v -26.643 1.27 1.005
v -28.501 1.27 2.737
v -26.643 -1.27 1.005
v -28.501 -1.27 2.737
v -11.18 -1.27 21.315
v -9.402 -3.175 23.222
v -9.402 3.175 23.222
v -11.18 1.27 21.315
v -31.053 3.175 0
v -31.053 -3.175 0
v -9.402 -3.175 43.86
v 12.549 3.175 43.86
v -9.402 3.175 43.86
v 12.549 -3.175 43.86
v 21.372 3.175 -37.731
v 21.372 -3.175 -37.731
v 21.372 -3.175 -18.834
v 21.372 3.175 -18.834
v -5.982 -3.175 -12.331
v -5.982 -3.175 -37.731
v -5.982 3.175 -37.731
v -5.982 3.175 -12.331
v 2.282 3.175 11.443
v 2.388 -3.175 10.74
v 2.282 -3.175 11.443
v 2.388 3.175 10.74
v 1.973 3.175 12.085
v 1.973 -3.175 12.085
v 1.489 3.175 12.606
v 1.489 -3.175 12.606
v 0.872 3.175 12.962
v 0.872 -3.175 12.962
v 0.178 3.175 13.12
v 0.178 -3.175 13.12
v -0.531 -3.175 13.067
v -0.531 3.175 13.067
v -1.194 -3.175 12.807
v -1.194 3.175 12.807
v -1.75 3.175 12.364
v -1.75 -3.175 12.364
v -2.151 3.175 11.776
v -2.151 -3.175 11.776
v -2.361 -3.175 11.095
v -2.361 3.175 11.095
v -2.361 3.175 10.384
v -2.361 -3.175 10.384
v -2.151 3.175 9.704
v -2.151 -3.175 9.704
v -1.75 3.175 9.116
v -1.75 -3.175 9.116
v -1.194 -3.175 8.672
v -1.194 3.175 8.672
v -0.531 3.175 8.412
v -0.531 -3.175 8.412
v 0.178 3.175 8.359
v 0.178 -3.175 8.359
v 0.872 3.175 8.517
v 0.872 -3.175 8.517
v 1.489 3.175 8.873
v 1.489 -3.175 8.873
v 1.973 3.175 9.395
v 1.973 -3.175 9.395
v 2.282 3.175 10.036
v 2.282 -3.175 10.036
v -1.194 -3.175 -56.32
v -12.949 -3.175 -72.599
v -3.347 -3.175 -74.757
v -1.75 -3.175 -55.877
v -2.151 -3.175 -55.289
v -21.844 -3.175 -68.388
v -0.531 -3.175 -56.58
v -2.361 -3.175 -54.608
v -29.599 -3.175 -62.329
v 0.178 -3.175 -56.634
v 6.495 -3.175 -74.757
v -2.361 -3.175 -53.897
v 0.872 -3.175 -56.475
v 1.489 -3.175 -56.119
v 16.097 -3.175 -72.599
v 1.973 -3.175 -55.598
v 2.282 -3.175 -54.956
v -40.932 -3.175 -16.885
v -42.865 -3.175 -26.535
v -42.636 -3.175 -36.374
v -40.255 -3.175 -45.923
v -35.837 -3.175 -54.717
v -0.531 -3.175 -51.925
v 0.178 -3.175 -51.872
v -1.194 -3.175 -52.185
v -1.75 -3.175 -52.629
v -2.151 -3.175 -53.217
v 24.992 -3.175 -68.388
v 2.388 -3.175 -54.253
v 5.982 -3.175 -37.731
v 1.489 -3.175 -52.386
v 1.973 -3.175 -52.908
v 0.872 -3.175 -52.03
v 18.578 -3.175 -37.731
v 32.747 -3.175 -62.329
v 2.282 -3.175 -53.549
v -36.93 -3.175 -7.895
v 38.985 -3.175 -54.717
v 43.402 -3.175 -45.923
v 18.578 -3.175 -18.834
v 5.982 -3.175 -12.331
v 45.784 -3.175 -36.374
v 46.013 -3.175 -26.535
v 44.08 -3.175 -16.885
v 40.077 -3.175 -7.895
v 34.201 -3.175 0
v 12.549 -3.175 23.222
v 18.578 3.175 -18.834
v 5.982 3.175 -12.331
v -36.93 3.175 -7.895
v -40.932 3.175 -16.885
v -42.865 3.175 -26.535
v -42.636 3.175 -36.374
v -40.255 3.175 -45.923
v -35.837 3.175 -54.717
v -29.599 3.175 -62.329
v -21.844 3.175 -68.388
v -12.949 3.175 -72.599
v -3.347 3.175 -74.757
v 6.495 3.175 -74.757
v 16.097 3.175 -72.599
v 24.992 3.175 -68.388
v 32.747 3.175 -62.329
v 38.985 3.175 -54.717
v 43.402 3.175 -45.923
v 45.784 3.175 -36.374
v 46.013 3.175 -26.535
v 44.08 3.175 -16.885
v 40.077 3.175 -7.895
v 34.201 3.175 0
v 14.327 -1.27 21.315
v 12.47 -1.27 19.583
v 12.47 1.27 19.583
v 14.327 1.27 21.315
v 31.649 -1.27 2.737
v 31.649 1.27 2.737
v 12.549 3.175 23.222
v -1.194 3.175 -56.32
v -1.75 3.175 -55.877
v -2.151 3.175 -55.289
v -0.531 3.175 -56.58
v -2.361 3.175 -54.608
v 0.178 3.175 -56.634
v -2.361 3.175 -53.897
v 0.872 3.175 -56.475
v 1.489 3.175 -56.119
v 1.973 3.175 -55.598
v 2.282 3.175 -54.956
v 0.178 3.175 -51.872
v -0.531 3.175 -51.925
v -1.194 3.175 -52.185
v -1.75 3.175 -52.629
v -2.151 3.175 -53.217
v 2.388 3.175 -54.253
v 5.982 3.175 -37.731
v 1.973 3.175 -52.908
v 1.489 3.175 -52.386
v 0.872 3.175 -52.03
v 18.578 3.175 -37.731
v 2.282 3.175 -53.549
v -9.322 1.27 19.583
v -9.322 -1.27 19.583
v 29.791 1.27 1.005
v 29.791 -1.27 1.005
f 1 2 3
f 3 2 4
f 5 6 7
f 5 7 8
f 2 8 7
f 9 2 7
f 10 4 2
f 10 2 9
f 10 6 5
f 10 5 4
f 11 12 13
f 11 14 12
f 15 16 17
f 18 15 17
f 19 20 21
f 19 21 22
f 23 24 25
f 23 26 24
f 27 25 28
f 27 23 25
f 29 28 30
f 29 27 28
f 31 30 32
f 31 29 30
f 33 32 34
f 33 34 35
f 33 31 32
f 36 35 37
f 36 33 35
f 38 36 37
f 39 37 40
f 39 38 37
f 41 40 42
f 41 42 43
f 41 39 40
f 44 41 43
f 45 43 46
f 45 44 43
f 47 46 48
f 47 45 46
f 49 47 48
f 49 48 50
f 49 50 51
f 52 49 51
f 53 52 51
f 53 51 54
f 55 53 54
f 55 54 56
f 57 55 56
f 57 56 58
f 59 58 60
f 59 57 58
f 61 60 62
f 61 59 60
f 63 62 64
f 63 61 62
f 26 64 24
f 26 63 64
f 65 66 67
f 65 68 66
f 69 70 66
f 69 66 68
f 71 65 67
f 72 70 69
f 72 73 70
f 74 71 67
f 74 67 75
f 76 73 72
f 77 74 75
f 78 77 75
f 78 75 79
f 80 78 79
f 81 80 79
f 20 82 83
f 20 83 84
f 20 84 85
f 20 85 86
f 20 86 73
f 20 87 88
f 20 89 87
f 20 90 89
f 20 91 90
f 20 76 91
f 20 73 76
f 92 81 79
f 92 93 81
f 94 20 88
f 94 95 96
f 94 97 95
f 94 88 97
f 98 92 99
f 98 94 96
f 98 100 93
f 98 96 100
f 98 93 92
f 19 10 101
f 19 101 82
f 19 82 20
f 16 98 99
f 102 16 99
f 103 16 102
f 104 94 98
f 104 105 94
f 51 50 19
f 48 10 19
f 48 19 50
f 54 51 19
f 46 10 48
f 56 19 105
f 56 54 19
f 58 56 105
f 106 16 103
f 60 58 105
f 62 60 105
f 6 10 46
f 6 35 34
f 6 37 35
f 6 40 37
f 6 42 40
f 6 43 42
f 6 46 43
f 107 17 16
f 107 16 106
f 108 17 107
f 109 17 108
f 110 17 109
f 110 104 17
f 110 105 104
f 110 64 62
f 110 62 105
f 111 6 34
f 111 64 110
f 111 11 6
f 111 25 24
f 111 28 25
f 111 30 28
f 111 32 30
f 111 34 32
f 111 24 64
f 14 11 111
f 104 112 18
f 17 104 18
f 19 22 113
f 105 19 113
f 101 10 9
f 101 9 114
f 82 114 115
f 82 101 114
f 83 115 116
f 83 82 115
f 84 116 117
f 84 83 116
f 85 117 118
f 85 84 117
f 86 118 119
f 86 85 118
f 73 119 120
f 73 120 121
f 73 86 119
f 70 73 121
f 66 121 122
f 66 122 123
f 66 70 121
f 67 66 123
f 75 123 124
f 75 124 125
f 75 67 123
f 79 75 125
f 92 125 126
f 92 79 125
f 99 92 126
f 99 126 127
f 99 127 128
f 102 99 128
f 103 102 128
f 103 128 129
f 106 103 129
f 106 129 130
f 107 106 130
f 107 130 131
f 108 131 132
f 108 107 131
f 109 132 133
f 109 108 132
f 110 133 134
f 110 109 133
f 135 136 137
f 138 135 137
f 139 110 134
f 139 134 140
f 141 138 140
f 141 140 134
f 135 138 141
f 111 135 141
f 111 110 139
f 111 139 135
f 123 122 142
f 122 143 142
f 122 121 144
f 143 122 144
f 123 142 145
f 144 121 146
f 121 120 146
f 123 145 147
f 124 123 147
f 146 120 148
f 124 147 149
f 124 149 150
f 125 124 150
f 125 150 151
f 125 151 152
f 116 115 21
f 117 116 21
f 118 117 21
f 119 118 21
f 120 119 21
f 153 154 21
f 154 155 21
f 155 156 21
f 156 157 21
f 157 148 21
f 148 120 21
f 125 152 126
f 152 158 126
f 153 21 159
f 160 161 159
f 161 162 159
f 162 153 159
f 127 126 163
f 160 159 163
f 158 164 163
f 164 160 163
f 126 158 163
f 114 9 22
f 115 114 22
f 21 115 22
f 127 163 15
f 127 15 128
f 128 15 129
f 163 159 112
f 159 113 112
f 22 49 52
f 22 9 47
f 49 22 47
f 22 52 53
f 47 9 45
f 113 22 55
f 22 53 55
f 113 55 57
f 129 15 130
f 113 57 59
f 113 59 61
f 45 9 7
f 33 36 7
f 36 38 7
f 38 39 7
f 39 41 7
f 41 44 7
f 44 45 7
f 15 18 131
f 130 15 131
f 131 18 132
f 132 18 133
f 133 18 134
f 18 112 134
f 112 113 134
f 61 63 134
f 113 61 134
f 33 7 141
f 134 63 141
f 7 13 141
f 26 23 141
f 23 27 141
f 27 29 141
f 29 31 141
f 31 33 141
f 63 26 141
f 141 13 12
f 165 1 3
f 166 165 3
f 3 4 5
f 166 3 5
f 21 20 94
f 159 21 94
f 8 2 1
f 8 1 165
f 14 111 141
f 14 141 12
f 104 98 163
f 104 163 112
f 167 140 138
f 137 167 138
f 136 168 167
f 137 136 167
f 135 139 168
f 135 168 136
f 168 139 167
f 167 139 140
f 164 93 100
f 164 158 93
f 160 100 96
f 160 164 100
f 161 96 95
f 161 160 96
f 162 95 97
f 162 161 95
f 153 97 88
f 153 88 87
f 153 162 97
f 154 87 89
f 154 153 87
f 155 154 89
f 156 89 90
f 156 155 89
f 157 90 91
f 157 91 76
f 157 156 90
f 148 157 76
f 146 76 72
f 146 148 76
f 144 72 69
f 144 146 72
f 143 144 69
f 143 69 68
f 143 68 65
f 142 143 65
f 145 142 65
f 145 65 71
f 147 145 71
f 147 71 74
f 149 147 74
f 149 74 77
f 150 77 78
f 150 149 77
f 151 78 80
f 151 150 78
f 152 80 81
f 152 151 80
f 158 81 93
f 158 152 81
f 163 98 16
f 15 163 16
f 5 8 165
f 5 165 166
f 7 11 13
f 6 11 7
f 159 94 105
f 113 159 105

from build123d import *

# Parameters (mm, degrees)
F0_R     = 2.3876
F0_W     = 11.9644477963
F0_H     = 25.4
F0_W_2   = 2.794
F0_H_2   = 18.8976
F1_DEPTH = 3.175
F3_W     = 2.54
F3_H     = 25.4
F4_DEPTH = 2.54
F6_W     = 2.54
F6_H     = 25.4
F7_DEPTH = 2.54


with BuildPart() as f1:
    # F0 (on Front) → F1 (new body, symmetric)
    with BuildSketch(Plane.XZ):
        with BuildLine():
            Line((-9.4017383467, 23.2221963037), (-31.0533456504, 0))
            ThreePointArc((-31.0533456504, 0), (1.5738401562, -75.0292582617), (34.2010259628, 0))
            Line((34.2010259628, 0), (12.5494186591, 23.2221963037))
            Line((12.5494186591, 23.2221963037), (12.5494186591, 43.8596963037))
            Line((12.5494186591, 43.8596963037), (-9.4017383467, 43.8596963037))
            Line((-9.4017383467, 43.8596963037), (-9.4017383467, 23.2221963037))
        make_face()
        with Locations((0, -54.2525947094)):
            Circle(F0_R, mode=Mode.SUBTRACT)
        with Locations((0, -25.0313151628)):
            Rectangle(F0_W, F0_H, mode=Mode.SUBTRACT)
        with Locations((19.9750838982, -28.2825151628)):
            Rectangle(F0_W_2, F0_H_2, mode=Mode.SUBTRACT)
        with Locations((0, 10.739565827)):
            Circle(F0_R, mode=Mode.SUBTRACT)
    extrude(amount=F1_DEPTH, both=True)

    # F3 (on offset) → F4 (cut)
    with BuildSketch(Plane(origin=(-16.6122141895, 0, 15.4886787354), x_dir=(0, -1, 0), z_dir=(-0.7314077576, 0, 0.6819403875))):
        with Locations((0, -4.733831039)):
            Rectangle(F3_W, F3_H)
    extrude(amount=-F4_DEPTH, mode=Mode.SUBTRACT)

    # F6 (on offset) → F7 (cut)
    with BuildSketch(Plane(origin=(18.2960887755, 0, 17.0586676721), x_dir=(0, 1, 0), z_dir=(0.7314077576, 0, 0.6819403875))):
        with Locations((0, -6.8803708986)):
            Rectangle(F6_W, F6_H)
    extrude(amount=-F7_DEPTH, mode=Mode.SUBTRACT)


solid = f1.part
